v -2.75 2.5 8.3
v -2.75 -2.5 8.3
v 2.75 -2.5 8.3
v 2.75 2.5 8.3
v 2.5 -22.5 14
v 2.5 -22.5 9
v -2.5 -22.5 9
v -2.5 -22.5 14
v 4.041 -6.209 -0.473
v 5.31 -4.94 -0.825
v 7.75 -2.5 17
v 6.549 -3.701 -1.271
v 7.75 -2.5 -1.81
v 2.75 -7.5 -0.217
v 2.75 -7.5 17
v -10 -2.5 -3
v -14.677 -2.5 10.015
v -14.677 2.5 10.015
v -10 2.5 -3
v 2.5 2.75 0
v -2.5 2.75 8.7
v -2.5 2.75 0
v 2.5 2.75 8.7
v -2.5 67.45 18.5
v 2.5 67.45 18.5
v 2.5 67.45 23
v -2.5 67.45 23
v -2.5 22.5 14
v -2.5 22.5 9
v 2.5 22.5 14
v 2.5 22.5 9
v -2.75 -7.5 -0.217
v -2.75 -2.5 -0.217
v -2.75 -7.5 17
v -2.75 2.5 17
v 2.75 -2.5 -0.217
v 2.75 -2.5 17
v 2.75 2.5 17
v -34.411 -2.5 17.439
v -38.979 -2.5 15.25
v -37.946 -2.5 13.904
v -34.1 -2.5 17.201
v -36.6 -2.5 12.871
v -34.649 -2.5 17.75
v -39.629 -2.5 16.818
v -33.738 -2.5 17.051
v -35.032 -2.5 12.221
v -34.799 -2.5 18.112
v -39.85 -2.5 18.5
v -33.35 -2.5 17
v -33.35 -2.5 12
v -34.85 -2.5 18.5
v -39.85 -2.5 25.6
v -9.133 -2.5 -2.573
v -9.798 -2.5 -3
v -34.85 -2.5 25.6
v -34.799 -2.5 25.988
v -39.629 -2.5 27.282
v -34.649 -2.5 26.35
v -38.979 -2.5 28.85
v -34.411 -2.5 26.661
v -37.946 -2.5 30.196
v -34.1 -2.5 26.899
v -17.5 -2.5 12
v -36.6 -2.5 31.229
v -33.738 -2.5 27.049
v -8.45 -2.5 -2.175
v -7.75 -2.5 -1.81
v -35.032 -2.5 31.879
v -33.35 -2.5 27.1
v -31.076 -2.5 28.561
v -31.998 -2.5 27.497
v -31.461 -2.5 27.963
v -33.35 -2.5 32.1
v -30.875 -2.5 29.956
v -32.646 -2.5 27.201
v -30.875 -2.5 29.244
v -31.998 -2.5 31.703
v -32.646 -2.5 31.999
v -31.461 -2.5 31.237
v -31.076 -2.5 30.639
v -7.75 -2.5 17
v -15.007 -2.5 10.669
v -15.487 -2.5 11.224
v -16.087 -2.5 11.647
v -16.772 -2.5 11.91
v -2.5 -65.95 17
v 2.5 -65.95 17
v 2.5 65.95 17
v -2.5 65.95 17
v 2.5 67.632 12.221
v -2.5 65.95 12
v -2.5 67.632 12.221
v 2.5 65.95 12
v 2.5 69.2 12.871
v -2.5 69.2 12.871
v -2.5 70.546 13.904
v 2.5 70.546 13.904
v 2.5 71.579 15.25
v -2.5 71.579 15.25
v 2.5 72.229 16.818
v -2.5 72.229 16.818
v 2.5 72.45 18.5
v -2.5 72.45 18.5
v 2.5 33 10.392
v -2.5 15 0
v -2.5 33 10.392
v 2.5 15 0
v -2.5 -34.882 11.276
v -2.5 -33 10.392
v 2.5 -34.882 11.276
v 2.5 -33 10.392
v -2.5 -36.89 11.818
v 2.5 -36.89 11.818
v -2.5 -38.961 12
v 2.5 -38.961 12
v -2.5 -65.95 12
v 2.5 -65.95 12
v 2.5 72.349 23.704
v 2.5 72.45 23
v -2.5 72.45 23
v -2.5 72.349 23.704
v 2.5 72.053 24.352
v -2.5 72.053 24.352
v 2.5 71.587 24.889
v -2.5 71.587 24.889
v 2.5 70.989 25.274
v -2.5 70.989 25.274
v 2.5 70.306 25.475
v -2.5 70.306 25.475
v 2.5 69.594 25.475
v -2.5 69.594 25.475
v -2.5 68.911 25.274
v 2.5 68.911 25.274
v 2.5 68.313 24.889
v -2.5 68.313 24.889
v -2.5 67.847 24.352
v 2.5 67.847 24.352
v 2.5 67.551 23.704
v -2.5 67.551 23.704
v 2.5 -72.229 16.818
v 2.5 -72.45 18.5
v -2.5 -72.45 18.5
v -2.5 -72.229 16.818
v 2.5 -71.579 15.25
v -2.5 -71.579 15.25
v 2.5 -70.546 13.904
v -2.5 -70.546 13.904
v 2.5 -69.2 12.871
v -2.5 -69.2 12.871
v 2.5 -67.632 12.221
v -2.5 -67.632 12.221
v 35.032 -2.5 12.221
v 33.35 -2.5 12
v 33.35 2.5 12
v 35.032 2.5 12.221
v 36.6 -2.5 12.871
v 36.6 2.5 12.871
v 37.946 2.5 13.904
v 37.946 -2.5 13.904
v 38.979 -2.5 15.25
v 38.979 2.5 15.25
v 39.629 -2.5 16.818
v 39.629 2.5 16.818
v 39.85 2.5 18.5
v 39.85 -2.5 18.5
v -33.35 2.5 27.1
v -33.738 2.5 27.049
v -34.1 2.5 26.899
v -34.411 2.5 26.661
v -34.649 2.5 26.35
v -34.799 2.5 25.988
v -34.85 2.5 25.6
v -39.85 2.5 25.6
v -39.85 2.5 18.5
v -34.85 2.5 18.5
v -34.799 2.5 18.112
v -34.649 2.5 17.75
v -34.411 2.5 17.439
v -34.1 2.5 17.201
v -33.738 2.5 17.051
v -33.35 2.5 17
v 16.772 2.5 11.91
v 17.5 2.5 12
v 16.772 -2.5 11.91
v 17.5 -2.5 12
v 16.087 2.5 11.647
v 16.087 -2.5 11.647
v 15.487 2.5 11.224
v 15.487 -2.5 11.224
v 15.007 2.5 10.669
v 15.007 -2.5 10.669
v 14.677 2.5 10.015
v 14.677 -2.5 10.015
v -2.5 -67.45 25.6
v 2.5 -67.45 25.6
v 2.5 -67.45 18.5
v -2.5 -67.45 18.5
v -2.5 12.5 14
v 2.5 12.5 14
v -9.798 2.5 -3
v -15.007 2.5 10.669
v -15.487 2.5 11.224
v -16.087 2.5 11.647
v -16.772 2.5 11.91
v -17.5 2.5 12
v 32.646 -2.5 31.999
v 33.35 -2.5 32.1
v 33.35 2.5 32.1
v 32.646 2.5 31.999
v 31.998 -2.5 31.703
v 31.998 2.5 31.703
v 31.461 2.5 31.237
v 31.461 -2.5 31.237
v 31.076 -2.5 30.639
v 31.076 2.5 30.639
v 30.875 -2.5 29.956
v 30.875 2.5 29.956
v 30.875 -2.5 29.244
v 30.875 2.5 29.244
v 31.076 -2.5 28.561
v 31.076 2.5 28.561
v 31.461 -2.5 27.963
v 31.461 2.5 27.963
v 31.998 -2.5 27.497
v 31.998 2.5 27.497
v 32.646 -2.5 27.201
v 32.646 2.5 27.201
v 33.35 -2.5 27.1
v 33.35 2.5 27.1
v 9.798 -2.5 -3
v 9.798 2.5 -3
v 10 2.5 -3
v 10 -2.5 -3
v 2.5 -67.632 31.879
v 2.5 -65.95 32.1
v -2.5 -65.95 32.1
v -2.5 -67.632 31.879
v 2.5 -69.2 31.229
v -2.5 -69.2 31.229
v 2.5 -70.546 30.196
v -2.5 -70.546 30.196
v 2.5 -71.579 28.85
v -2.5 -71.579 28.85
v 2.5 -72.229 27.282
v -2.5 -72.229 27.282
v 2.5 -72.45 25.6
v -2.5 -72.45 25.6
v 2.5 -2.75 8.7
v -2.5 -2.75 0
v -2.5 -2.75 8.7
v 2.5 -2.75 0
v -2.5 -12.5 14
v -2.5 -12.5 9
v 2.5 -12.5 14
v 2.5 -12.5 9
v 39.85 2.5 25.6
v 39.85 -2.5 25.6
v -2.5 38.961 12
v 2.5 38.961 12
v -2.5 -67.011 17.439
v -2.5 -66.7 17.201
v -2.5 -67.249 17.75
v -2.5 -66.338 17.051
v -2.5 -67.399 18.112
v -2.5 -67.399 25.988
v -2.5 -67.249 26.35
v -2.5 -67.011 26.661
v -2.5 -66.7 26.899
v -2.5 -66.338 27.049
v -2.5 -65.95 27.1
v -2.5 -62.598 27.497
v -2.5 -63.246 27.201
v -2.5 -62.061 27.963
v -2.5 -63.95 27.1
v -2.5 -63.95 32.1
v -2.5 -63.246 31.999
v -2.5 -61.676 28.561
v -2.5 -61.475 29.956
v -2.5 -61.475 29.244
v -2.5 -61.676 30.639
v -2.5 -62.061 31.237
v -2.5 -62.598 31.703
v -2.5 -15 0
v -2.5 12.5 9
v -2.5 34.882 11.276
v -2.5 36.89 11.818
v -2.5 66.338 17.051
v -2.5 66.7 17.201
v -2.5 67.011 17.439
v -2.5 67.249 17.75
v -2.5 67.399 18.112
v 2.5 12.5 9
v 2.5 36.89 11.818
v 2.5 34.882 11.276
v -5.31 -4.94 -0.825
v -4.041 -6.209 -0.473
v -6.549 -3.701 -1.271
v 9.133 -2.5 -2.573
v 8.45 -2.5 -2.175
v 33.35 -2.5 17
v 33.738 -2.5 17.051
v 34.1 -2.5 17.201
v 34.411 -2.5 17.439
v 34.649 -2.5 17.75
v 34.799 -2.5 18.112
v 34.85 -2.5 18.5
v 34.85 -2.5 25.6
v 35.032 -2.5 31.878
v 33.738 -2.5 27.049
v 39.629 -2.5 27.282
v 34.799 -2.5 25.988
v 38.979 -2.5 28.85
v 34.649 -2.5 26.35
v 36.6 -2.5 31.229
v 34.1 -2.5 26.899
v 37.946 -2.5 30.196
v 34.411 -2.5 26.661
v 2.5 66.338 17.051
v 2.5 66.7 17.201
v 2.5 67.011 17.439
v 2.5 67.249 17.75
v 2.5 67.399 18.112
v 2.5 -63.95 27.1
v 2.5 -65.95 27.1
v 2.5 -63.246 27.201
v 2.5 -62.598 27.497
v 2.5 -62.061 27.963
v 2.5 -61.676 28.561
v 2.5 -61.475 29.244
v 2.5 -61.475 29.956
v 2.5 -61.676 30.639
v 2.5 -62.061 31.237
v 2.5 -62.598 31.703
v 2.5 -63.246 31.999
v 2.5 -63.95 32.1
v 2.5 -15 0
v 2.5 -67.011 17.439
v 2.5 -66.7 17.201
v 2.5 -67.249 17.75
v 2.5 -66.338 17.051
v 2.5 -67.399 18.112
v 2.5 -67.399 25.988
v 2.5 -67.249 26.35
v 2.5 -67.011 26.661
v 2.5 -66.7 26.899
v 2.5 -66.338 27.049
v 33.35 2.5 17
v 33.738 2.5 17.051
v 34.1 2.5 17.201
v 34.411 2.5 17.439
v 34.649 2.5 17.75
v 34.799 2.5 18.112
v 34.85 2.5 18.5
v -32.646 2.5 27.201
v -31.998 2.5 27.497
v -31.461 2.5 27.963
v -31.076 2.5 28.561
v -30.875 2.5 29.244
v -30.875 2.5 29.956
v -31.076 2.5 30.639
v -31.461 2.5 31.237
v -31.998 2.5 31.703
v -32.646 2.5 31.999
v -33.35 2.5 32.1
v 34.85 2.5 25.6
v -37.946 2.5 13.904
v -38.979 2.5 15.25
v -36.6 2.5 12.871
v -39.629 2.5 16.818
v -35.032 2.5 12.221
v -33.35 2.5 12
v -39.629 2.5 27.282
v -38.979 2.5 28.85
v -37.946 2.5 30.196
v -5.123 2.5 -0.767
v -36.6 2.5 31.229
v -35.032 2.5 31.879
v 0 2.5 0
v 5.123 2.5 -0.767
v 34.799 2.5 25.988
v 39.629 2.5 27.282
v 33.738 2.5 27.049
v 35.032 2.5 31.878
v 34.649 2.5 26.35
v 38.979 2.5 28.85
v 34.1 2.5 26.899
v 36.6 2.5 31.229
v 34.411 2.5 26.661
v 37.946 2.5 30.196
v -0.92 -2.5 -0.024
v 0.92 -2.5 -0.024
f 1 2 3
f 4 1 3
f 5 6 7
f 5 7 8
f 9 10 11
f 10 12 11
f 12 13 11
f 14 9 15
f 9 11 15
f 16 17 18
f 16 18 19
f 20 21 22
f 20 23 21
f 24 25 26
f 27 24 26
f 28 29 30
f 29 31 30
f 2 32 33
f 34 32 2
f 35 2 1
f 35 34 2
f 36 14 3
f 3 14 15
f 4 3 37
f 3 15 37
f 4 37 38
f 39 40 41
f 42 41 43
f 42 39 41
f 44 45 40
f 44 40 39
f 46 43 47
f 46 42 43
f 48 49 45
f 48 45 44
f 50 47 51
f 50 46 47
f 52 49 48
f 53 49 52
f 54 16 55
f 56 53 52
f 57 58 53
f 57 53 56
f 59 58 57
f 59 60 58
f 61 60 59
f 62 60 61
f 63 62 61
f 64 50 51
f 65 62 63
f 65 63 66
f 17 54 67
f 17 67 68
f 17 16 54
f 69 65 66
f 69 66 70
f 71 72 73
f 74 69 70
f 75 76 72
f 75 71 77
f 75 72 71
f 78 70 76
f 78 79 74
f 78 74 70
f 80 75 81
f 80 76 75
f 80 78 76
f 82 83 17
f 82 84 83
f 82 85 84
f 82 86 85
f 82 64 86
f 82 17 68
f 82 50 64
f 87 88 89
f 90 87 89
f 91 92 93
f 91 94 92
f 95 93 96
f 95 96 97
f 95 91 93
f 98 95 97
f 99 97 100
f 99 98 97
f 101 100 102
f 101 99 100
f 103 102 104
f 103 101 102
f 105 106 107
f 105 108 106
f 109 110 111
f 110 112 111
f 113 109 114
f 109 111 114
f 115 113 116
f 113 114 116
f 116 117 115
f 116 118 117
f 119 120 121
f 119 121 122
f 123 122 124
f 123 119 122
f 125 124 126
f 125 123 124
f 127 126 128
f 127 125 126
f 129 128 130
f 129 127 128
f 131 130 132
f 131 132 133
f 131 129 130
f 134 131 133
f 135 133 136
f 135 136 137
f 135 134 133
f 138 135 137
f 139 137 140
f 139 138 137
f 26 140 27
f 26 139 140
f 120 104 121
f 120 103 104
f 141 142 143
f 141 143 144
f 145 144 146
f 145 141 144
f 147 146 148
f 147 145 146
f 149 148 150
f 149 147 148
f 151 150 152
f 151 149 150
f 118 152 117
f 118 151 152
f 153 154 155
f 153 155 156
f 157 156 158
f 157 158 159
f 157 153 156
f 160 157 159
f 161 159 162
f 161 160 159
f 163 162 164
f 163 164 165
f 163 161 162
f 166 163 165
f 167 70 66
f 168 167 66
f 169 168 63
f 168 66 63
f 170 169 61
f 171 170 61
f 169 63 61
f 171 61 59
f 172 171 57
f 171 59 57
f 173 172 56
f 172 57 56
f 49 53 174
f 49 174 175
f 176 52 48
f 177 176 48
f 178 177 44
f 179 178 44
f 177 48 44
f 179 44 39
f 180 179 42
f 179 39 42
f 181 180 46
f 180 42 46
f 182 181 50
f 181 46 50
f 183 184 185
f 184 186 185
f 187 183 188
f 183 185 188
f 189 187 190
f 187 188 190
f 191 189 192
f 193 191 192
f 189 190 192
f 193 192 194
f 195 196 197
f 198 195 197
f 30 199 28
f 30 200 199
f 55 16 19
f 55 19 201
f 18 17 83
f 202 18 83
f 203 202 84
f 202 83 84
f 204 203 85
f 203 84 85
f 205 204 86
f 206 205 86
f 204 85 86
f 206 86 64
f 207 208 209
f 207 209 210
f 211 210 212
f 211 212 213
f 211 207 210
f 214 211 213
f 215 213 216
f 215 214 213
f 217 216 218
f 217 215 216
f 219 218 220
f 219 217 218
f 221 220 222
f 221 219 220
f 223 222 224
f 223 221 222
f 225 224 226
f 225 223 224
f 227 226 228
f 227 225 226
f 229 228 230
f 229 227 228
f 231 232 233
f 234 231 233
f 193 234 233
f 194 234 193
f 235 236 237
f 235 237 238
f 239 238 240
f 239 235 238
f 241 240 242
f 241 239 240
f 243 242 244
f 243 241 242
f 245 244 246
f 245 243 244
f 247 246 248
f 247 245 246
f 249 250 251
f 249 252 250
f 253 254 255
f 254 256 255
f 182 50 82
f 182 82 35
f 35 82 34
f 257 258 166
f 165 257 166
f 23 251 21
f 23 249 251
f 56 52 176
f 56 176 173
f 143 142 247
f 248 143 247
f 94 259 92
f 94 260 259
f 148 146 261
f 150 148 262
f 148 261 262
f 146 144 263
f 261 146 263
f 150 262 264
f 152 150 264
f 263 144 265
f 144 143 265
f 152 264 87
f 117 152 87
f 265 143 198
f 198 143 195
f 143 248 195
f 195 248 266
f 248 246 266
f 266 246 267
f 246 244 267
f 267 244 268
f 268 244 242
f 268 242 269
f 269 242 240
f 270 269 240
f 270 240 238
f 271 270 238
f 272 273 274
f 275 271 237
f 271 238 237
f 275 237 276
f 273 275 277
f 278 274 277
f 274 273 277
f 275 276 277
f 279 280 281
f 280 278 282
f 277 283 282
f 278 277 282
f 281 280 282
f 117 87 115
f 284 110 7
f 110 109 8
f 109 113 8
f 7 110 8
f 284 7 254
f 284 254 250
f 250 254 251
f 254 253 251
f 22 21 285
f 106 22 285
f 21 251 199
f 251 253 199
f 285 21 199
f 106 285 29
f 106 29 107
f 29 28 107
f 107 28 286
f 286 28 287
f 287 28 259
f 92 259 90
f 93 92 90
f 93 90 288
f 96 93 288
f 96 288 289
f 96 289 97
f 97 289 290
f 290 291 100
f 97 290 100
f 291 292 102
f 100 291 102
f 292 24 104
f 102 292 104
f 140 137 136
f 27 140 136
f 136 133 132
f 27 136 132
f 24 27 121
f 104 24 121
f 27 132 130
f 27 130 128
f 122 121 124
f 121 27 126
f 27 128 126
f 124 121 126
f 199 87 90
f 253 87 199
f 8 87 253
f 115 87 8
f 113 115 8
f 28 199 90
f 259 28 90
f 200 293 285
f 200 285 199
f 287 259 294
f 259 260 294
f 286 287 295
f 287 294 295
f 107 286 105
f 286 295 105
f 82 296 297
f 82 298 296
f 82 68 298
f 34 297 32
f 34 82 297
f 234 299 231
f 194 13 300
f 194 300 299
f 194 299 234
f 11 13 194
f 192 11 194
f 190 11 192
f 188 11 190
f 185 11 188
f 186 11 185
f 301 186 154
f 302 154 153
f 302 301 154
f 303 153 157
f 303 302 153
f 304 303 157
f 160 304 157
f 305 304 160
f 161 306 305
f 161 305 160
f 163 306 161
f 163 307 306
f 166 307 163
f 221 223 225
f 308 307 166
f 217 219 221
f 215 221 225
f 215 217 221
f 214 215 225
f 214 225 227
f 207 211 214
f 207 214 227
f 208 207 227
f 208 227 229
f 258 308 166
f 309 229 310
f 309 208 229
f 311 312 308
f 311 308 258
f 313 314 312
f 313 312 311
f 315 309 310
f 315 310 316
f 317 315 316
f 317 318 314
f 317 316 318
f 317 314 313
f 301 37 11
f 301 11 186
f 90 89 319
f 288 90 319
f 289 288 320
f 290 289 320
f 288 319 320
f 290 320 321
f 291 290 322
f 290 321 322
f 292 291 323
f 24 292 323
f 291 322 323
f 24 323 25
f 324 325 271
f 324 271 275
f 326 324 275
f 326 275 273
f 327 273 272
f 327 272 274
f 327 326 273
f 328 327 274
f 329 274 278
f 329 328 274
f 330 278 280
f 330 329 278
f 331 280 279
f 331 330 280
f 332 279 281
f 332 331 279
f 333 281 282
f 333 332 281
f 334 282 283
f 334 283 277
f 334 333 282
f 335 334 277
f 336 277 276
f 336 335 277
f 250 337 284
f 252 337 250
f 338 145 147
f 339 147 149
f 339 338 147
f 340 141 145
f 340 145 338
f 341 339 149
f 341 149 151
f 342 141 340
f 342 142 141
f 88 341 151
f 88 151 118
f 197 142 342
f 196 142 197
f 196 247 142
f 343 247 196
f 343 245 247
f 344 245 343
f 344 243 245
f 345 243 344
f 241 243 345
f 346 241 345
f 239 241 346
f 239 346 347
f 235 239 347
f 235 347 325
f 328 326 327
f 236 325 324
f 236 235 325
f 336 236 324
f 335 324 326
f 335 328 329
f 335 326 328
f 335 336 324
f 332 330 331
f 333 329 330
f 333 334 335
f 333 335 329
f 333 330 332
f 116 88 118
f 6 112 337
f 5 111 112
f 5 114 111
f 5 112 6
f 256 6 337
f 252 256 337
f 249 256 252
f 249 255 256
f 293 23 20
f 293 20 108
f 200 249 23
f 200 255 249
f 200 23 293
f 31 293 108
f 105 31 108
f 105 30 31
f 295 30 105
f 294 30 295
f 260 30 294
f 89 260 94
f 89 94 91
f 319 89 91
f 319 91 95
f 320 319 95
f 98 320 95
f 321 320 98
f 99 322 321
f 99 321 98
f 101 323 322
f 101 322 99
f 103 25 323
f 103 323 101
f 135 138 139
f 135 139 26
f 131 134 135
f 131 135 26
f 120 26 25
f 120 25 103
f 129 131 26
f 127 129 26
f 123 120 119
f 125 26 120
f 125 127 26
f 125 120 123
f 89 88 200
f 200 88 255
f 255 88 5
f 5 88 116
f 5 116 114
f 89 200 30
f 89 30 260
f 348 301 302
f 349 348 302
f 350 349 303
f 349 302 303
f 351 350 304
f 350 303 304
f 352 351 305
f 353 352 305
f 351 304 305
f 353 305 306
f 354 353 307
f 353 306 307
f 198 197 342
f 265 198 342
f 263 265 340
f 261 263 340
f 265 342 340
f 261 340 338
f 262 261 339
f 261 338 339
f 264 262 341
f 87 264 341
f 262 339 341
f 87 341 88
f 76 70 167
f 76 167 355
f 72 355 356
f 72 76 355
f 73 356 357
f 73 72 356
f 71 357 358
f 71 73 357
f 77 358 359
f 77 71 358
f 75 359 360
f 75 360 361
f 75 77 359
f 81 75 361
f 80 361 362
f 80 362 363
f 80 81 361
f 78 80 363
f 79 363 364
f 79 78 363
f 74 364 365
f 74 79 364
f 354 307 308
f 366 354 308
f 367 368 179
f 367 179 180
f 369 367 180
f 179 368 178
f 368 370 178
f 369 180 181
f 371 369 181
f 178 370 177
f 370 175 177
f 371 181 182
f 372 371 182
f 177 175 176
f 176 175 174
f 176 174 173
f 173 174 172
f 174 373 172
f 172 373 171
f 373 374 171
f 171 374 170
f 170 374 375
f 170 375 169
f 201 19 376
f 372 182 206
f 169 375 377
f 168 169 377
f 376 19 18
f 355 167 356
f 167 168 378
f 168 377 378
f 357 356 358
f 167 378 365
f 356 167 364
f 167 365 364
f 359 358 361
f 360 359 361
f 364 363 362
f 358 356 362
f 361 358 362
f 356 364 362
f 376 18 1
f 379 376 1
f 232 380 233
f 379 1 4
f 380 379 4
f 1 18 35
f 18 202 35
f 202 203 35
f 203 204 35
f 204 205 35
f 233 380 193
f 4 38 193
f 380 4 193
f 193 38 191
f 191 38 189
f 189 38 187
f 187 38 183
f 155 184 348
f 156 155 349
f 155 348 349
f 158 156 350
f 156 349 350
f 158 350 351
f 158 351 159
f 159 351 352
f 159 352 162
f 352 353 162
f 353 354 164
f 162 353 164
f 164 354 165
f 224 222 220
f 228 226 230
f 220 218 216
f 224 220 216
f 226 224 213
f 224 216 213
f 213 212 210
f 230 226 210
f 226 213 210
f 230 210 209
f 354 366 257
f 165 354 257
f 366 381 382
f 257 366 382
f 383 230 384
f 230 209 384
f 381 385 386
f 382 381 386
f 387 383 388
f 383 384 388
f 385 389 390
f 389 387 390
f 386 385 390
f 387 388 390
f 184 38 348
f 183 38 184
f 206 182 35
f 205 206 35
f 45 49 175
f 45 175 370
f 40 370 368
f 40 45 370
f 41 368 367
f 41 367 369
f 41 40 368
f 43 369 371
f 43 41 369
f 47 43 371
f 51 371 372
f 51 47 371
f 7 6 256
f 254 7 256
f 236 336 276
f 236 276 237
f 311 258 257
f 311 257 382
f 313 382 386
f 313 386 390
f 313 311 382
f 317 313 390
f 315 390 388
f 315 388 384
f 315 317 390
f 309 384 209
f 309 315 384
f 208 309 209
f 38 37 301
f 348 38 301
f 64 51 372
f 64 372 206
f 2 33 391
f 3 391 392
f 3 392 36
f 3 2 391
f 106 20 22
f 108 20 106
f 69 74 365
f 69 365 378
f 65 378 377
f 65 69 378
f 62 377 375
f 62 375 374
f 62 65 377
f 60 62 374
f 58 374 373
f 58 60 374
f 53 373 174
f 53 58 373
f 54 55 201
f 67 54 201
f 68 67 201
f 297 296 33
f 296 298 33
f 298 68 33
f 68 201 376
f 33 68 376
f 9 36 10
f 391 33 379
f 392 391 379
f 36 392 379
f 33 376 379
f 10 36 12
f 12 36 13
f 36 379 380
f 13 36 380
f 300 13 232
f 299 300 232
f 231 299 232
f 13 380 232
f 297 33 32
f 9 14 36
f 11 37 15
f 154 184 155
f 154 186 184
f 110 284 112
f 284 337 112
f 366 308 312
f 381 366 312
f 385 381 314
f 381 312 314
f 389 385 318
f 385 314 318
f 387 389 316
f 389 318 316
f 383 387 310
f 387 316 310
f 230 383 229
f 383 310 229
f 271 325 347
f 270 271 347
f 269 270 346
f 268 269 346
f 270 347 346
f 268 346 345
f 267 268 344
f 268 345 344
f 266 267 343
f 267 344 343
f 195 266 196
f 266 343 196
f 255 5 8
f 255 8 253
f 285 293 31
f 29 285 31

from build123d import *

# Parameters (mm, degrees)
SKETCH_W     = 10
SKETCH_H     = 5
PAD_DEPTH    = 2.5
PAD001_DEPTH = 2.5
PAD002_DEPTH = 20
POCKET_DEPTH = 10


with BuildPart() as vertical:
    # Sketch → Pad (new body, symmetric)
    with BuildSketch(Plane.YZ):
        with BuildLine():
            Line((72.45, 18.5), (72.45, 23))
            ThreePointArc((72.45, 23), (69.95, 25.5), (67.45, 23))
            Line((67.45, 18.500001), (67.45, 23))
            ThreePointArc((65.95, 17), (67.01066, 17.43934), (67.45, 18.500001))
            Line((-65.95, 17), (65.95, 17))
            ThreePointArc((-67.45, 18.500001), (-67.01066, 17.43934), (-65.95, 17))
            Line((-67.45, 25.599999), (-67.45, 18.500001))
            ThreePointArc((-65.950001, 27.1), (-67.010661, 26.66066), (-67.45, 25.599999))
            Line((-65.950001, 27.1), (-63.950001, 27.1))
            ThreePointArc((-63.950001, 27.1), (-61.45, 29.599999), (-63.949999, 32.1))
            Line((-63.949999, 32.1), (-65.95, 32.1))
            ThreePointArc((-65.95, 32.1), (-70.546194, 30.196194), (-72.45, 25.6))
            Line((-72.45, 18.500001), (-72.45, 25.6))
            ThreePointArc((-72.45, 18.500001), (-70.546194, 13.903806), (-65.95, 12))
            Line((-65.95, 12), (-38.960811, 12))
            ThreePointArc((-33, 10.392302), (-35.873904, 11.591026), (-38.960811, 12))
            Line((-15, 0), (-33, 10.392302))
            Line((-15, 0), (-2.75, 0))
            Line((-2.75, 0), (-2.75, 8.7))
            Line((-2.75, 8.7), (2.75, 8.7))
            Line((2.75, 8.7), (2.75, 0))
            Line((2.75, 0), (15, 0))
            Line((15, 0), (33, 10.392302))
            ThreePointArc((38.960811, 12), (35.873904, 11.591026), (33, 10.392302))
            Line((38.960811, 12), (65.95, 12))
            ThreePointArc((65.95, 12), (70.546194, 13.903806), (72.45, 18.5))
        make_face()
        with Locations((-17.5, 11.5)):
            Rectangle(SKETCH_W, SKETCH_H, mode=Mode.SUBTRACT)
        with Locations((17.5, 11.5)):
            Rectangle(SKETCH_W, SKETCH_H, mode=Mode.SUBTRACT)
    extrude(amount=PAD_DEPTH, both=True)


with BuildPart() as fusion:
    # Sketch001 → Pad001 (new body, symmetric)
    with BuildSketch(Plane.XZ):
        with BuildLine():
            Line((17.5, 11.999986), (33.350007, 12))
            ThreePointArc((33.350007, 12), (37.946196, 13.903808), (39.85, 18.499999))
            Line((39.85, 25.599974), (39.85, 18.499999))
            ThreePointArc((39.85, 25.599974), (37.946194, 30.196167), (33.350001, 32.099973))
            ThreePointArc((33.350001, 32.099973), (30.850001, 29.599972), (33.350001, 27.099973))
            ThreePointArc((34.85, 25.599974), (34.41066, 26.660633), (33.350001, 27.099973))
            Line((34.85, 18.499999), (34.85, 25.599974))
            ThreePointArc((33.350001, 17), (34.41066, 17.43934), (34.85, 18.499999))
            Line((2.75, 17), (33.350001, 17))
            Line((2.75, 8.3), (2.75, 17))
            Line((-2.75, 8.3), (2.75, 8.3))
            Line((-2.75, 16.999986), (-2.75, 8.3))
            Line((-33.35, 16.999986), (-2.75, 16.999986))
            ThreePointArc((-34.85, 18.499999), (-34.410665, 17.43933), (-33.35, 16.999986))
            Line((-34.85, 18.499999), (-34.85, 25.599974))
            ThreePointArc((-33.350001, 27.099986), (-34.410665, 26.660641), (-34.85, 25.599974))
            ThreePointArc((-33.350001, 27.099986), (-30.850001, 29.599986), (-33.350001, 32.099986))
            ThreePointArc((-33.350001, 32.099986), (-37.946199, 30.196175), (-39.85, 25.599974))
            Line((-39.85, 25.599974), (-39.85, 18.499999))
            ThreePointArc((-39.85, 18.499999), (-37.946199, 13.903797), (-33.350001, 11.999986))
            Line((-33.350001, 11.999986), (-17.5, 11.999986))
            ThreePointArc((-14.676753, 10.014517), (-15.774253, 11.453921), (-17.5, 11.999986))
            Line((-14.676753, 10.014517), (-10, -3))
            Line((-10, -3), (10, -3))
            Line((10, -3), (14.676755, 10.014518))
            ThreePointArc((17.5, 11.999986), (15.774255, 11.45392), (14.676755, 10.014518))
        make_face()
    extrude(amount=PAD001_DEPTH, both=True)

    # Sketch002 → Pad002 (new body)
    with BuildSketch(Plane(origin=(0, 0, 16.999986), x_dir=(-1, 0, 0), z_dir=(0, 0, 1))):
        Polygon((-7.75, 2.5), (-2.75, 7.5), (-2.75, 2.5), align=None)
        Polygon((2.75, 7.5), (2.75, 2.5), (7.75, 2.5), align=None)
    extrude(amount=-PAD002_DEPTH)

    # Sketch003 → Pocket (cut)
    with BuildSketch(Plane(origin=(0, 2.5, 0), x_dir=(1, 0, 0), z_dir=(0, 1, 0))):
        with BuildLine():
            ThreePointArc((-10, 3.138593), (0, 0), (10, 3.138593))
            Line((-10, 3.138593), (10, 3.138593))
        make_face()
    extrude(amount=-POCKET_DEPTH, mode=Mode.SUBTRACT)

    # Fusion: union Vertical
    add(vertical.part)


solid = fusion.part
